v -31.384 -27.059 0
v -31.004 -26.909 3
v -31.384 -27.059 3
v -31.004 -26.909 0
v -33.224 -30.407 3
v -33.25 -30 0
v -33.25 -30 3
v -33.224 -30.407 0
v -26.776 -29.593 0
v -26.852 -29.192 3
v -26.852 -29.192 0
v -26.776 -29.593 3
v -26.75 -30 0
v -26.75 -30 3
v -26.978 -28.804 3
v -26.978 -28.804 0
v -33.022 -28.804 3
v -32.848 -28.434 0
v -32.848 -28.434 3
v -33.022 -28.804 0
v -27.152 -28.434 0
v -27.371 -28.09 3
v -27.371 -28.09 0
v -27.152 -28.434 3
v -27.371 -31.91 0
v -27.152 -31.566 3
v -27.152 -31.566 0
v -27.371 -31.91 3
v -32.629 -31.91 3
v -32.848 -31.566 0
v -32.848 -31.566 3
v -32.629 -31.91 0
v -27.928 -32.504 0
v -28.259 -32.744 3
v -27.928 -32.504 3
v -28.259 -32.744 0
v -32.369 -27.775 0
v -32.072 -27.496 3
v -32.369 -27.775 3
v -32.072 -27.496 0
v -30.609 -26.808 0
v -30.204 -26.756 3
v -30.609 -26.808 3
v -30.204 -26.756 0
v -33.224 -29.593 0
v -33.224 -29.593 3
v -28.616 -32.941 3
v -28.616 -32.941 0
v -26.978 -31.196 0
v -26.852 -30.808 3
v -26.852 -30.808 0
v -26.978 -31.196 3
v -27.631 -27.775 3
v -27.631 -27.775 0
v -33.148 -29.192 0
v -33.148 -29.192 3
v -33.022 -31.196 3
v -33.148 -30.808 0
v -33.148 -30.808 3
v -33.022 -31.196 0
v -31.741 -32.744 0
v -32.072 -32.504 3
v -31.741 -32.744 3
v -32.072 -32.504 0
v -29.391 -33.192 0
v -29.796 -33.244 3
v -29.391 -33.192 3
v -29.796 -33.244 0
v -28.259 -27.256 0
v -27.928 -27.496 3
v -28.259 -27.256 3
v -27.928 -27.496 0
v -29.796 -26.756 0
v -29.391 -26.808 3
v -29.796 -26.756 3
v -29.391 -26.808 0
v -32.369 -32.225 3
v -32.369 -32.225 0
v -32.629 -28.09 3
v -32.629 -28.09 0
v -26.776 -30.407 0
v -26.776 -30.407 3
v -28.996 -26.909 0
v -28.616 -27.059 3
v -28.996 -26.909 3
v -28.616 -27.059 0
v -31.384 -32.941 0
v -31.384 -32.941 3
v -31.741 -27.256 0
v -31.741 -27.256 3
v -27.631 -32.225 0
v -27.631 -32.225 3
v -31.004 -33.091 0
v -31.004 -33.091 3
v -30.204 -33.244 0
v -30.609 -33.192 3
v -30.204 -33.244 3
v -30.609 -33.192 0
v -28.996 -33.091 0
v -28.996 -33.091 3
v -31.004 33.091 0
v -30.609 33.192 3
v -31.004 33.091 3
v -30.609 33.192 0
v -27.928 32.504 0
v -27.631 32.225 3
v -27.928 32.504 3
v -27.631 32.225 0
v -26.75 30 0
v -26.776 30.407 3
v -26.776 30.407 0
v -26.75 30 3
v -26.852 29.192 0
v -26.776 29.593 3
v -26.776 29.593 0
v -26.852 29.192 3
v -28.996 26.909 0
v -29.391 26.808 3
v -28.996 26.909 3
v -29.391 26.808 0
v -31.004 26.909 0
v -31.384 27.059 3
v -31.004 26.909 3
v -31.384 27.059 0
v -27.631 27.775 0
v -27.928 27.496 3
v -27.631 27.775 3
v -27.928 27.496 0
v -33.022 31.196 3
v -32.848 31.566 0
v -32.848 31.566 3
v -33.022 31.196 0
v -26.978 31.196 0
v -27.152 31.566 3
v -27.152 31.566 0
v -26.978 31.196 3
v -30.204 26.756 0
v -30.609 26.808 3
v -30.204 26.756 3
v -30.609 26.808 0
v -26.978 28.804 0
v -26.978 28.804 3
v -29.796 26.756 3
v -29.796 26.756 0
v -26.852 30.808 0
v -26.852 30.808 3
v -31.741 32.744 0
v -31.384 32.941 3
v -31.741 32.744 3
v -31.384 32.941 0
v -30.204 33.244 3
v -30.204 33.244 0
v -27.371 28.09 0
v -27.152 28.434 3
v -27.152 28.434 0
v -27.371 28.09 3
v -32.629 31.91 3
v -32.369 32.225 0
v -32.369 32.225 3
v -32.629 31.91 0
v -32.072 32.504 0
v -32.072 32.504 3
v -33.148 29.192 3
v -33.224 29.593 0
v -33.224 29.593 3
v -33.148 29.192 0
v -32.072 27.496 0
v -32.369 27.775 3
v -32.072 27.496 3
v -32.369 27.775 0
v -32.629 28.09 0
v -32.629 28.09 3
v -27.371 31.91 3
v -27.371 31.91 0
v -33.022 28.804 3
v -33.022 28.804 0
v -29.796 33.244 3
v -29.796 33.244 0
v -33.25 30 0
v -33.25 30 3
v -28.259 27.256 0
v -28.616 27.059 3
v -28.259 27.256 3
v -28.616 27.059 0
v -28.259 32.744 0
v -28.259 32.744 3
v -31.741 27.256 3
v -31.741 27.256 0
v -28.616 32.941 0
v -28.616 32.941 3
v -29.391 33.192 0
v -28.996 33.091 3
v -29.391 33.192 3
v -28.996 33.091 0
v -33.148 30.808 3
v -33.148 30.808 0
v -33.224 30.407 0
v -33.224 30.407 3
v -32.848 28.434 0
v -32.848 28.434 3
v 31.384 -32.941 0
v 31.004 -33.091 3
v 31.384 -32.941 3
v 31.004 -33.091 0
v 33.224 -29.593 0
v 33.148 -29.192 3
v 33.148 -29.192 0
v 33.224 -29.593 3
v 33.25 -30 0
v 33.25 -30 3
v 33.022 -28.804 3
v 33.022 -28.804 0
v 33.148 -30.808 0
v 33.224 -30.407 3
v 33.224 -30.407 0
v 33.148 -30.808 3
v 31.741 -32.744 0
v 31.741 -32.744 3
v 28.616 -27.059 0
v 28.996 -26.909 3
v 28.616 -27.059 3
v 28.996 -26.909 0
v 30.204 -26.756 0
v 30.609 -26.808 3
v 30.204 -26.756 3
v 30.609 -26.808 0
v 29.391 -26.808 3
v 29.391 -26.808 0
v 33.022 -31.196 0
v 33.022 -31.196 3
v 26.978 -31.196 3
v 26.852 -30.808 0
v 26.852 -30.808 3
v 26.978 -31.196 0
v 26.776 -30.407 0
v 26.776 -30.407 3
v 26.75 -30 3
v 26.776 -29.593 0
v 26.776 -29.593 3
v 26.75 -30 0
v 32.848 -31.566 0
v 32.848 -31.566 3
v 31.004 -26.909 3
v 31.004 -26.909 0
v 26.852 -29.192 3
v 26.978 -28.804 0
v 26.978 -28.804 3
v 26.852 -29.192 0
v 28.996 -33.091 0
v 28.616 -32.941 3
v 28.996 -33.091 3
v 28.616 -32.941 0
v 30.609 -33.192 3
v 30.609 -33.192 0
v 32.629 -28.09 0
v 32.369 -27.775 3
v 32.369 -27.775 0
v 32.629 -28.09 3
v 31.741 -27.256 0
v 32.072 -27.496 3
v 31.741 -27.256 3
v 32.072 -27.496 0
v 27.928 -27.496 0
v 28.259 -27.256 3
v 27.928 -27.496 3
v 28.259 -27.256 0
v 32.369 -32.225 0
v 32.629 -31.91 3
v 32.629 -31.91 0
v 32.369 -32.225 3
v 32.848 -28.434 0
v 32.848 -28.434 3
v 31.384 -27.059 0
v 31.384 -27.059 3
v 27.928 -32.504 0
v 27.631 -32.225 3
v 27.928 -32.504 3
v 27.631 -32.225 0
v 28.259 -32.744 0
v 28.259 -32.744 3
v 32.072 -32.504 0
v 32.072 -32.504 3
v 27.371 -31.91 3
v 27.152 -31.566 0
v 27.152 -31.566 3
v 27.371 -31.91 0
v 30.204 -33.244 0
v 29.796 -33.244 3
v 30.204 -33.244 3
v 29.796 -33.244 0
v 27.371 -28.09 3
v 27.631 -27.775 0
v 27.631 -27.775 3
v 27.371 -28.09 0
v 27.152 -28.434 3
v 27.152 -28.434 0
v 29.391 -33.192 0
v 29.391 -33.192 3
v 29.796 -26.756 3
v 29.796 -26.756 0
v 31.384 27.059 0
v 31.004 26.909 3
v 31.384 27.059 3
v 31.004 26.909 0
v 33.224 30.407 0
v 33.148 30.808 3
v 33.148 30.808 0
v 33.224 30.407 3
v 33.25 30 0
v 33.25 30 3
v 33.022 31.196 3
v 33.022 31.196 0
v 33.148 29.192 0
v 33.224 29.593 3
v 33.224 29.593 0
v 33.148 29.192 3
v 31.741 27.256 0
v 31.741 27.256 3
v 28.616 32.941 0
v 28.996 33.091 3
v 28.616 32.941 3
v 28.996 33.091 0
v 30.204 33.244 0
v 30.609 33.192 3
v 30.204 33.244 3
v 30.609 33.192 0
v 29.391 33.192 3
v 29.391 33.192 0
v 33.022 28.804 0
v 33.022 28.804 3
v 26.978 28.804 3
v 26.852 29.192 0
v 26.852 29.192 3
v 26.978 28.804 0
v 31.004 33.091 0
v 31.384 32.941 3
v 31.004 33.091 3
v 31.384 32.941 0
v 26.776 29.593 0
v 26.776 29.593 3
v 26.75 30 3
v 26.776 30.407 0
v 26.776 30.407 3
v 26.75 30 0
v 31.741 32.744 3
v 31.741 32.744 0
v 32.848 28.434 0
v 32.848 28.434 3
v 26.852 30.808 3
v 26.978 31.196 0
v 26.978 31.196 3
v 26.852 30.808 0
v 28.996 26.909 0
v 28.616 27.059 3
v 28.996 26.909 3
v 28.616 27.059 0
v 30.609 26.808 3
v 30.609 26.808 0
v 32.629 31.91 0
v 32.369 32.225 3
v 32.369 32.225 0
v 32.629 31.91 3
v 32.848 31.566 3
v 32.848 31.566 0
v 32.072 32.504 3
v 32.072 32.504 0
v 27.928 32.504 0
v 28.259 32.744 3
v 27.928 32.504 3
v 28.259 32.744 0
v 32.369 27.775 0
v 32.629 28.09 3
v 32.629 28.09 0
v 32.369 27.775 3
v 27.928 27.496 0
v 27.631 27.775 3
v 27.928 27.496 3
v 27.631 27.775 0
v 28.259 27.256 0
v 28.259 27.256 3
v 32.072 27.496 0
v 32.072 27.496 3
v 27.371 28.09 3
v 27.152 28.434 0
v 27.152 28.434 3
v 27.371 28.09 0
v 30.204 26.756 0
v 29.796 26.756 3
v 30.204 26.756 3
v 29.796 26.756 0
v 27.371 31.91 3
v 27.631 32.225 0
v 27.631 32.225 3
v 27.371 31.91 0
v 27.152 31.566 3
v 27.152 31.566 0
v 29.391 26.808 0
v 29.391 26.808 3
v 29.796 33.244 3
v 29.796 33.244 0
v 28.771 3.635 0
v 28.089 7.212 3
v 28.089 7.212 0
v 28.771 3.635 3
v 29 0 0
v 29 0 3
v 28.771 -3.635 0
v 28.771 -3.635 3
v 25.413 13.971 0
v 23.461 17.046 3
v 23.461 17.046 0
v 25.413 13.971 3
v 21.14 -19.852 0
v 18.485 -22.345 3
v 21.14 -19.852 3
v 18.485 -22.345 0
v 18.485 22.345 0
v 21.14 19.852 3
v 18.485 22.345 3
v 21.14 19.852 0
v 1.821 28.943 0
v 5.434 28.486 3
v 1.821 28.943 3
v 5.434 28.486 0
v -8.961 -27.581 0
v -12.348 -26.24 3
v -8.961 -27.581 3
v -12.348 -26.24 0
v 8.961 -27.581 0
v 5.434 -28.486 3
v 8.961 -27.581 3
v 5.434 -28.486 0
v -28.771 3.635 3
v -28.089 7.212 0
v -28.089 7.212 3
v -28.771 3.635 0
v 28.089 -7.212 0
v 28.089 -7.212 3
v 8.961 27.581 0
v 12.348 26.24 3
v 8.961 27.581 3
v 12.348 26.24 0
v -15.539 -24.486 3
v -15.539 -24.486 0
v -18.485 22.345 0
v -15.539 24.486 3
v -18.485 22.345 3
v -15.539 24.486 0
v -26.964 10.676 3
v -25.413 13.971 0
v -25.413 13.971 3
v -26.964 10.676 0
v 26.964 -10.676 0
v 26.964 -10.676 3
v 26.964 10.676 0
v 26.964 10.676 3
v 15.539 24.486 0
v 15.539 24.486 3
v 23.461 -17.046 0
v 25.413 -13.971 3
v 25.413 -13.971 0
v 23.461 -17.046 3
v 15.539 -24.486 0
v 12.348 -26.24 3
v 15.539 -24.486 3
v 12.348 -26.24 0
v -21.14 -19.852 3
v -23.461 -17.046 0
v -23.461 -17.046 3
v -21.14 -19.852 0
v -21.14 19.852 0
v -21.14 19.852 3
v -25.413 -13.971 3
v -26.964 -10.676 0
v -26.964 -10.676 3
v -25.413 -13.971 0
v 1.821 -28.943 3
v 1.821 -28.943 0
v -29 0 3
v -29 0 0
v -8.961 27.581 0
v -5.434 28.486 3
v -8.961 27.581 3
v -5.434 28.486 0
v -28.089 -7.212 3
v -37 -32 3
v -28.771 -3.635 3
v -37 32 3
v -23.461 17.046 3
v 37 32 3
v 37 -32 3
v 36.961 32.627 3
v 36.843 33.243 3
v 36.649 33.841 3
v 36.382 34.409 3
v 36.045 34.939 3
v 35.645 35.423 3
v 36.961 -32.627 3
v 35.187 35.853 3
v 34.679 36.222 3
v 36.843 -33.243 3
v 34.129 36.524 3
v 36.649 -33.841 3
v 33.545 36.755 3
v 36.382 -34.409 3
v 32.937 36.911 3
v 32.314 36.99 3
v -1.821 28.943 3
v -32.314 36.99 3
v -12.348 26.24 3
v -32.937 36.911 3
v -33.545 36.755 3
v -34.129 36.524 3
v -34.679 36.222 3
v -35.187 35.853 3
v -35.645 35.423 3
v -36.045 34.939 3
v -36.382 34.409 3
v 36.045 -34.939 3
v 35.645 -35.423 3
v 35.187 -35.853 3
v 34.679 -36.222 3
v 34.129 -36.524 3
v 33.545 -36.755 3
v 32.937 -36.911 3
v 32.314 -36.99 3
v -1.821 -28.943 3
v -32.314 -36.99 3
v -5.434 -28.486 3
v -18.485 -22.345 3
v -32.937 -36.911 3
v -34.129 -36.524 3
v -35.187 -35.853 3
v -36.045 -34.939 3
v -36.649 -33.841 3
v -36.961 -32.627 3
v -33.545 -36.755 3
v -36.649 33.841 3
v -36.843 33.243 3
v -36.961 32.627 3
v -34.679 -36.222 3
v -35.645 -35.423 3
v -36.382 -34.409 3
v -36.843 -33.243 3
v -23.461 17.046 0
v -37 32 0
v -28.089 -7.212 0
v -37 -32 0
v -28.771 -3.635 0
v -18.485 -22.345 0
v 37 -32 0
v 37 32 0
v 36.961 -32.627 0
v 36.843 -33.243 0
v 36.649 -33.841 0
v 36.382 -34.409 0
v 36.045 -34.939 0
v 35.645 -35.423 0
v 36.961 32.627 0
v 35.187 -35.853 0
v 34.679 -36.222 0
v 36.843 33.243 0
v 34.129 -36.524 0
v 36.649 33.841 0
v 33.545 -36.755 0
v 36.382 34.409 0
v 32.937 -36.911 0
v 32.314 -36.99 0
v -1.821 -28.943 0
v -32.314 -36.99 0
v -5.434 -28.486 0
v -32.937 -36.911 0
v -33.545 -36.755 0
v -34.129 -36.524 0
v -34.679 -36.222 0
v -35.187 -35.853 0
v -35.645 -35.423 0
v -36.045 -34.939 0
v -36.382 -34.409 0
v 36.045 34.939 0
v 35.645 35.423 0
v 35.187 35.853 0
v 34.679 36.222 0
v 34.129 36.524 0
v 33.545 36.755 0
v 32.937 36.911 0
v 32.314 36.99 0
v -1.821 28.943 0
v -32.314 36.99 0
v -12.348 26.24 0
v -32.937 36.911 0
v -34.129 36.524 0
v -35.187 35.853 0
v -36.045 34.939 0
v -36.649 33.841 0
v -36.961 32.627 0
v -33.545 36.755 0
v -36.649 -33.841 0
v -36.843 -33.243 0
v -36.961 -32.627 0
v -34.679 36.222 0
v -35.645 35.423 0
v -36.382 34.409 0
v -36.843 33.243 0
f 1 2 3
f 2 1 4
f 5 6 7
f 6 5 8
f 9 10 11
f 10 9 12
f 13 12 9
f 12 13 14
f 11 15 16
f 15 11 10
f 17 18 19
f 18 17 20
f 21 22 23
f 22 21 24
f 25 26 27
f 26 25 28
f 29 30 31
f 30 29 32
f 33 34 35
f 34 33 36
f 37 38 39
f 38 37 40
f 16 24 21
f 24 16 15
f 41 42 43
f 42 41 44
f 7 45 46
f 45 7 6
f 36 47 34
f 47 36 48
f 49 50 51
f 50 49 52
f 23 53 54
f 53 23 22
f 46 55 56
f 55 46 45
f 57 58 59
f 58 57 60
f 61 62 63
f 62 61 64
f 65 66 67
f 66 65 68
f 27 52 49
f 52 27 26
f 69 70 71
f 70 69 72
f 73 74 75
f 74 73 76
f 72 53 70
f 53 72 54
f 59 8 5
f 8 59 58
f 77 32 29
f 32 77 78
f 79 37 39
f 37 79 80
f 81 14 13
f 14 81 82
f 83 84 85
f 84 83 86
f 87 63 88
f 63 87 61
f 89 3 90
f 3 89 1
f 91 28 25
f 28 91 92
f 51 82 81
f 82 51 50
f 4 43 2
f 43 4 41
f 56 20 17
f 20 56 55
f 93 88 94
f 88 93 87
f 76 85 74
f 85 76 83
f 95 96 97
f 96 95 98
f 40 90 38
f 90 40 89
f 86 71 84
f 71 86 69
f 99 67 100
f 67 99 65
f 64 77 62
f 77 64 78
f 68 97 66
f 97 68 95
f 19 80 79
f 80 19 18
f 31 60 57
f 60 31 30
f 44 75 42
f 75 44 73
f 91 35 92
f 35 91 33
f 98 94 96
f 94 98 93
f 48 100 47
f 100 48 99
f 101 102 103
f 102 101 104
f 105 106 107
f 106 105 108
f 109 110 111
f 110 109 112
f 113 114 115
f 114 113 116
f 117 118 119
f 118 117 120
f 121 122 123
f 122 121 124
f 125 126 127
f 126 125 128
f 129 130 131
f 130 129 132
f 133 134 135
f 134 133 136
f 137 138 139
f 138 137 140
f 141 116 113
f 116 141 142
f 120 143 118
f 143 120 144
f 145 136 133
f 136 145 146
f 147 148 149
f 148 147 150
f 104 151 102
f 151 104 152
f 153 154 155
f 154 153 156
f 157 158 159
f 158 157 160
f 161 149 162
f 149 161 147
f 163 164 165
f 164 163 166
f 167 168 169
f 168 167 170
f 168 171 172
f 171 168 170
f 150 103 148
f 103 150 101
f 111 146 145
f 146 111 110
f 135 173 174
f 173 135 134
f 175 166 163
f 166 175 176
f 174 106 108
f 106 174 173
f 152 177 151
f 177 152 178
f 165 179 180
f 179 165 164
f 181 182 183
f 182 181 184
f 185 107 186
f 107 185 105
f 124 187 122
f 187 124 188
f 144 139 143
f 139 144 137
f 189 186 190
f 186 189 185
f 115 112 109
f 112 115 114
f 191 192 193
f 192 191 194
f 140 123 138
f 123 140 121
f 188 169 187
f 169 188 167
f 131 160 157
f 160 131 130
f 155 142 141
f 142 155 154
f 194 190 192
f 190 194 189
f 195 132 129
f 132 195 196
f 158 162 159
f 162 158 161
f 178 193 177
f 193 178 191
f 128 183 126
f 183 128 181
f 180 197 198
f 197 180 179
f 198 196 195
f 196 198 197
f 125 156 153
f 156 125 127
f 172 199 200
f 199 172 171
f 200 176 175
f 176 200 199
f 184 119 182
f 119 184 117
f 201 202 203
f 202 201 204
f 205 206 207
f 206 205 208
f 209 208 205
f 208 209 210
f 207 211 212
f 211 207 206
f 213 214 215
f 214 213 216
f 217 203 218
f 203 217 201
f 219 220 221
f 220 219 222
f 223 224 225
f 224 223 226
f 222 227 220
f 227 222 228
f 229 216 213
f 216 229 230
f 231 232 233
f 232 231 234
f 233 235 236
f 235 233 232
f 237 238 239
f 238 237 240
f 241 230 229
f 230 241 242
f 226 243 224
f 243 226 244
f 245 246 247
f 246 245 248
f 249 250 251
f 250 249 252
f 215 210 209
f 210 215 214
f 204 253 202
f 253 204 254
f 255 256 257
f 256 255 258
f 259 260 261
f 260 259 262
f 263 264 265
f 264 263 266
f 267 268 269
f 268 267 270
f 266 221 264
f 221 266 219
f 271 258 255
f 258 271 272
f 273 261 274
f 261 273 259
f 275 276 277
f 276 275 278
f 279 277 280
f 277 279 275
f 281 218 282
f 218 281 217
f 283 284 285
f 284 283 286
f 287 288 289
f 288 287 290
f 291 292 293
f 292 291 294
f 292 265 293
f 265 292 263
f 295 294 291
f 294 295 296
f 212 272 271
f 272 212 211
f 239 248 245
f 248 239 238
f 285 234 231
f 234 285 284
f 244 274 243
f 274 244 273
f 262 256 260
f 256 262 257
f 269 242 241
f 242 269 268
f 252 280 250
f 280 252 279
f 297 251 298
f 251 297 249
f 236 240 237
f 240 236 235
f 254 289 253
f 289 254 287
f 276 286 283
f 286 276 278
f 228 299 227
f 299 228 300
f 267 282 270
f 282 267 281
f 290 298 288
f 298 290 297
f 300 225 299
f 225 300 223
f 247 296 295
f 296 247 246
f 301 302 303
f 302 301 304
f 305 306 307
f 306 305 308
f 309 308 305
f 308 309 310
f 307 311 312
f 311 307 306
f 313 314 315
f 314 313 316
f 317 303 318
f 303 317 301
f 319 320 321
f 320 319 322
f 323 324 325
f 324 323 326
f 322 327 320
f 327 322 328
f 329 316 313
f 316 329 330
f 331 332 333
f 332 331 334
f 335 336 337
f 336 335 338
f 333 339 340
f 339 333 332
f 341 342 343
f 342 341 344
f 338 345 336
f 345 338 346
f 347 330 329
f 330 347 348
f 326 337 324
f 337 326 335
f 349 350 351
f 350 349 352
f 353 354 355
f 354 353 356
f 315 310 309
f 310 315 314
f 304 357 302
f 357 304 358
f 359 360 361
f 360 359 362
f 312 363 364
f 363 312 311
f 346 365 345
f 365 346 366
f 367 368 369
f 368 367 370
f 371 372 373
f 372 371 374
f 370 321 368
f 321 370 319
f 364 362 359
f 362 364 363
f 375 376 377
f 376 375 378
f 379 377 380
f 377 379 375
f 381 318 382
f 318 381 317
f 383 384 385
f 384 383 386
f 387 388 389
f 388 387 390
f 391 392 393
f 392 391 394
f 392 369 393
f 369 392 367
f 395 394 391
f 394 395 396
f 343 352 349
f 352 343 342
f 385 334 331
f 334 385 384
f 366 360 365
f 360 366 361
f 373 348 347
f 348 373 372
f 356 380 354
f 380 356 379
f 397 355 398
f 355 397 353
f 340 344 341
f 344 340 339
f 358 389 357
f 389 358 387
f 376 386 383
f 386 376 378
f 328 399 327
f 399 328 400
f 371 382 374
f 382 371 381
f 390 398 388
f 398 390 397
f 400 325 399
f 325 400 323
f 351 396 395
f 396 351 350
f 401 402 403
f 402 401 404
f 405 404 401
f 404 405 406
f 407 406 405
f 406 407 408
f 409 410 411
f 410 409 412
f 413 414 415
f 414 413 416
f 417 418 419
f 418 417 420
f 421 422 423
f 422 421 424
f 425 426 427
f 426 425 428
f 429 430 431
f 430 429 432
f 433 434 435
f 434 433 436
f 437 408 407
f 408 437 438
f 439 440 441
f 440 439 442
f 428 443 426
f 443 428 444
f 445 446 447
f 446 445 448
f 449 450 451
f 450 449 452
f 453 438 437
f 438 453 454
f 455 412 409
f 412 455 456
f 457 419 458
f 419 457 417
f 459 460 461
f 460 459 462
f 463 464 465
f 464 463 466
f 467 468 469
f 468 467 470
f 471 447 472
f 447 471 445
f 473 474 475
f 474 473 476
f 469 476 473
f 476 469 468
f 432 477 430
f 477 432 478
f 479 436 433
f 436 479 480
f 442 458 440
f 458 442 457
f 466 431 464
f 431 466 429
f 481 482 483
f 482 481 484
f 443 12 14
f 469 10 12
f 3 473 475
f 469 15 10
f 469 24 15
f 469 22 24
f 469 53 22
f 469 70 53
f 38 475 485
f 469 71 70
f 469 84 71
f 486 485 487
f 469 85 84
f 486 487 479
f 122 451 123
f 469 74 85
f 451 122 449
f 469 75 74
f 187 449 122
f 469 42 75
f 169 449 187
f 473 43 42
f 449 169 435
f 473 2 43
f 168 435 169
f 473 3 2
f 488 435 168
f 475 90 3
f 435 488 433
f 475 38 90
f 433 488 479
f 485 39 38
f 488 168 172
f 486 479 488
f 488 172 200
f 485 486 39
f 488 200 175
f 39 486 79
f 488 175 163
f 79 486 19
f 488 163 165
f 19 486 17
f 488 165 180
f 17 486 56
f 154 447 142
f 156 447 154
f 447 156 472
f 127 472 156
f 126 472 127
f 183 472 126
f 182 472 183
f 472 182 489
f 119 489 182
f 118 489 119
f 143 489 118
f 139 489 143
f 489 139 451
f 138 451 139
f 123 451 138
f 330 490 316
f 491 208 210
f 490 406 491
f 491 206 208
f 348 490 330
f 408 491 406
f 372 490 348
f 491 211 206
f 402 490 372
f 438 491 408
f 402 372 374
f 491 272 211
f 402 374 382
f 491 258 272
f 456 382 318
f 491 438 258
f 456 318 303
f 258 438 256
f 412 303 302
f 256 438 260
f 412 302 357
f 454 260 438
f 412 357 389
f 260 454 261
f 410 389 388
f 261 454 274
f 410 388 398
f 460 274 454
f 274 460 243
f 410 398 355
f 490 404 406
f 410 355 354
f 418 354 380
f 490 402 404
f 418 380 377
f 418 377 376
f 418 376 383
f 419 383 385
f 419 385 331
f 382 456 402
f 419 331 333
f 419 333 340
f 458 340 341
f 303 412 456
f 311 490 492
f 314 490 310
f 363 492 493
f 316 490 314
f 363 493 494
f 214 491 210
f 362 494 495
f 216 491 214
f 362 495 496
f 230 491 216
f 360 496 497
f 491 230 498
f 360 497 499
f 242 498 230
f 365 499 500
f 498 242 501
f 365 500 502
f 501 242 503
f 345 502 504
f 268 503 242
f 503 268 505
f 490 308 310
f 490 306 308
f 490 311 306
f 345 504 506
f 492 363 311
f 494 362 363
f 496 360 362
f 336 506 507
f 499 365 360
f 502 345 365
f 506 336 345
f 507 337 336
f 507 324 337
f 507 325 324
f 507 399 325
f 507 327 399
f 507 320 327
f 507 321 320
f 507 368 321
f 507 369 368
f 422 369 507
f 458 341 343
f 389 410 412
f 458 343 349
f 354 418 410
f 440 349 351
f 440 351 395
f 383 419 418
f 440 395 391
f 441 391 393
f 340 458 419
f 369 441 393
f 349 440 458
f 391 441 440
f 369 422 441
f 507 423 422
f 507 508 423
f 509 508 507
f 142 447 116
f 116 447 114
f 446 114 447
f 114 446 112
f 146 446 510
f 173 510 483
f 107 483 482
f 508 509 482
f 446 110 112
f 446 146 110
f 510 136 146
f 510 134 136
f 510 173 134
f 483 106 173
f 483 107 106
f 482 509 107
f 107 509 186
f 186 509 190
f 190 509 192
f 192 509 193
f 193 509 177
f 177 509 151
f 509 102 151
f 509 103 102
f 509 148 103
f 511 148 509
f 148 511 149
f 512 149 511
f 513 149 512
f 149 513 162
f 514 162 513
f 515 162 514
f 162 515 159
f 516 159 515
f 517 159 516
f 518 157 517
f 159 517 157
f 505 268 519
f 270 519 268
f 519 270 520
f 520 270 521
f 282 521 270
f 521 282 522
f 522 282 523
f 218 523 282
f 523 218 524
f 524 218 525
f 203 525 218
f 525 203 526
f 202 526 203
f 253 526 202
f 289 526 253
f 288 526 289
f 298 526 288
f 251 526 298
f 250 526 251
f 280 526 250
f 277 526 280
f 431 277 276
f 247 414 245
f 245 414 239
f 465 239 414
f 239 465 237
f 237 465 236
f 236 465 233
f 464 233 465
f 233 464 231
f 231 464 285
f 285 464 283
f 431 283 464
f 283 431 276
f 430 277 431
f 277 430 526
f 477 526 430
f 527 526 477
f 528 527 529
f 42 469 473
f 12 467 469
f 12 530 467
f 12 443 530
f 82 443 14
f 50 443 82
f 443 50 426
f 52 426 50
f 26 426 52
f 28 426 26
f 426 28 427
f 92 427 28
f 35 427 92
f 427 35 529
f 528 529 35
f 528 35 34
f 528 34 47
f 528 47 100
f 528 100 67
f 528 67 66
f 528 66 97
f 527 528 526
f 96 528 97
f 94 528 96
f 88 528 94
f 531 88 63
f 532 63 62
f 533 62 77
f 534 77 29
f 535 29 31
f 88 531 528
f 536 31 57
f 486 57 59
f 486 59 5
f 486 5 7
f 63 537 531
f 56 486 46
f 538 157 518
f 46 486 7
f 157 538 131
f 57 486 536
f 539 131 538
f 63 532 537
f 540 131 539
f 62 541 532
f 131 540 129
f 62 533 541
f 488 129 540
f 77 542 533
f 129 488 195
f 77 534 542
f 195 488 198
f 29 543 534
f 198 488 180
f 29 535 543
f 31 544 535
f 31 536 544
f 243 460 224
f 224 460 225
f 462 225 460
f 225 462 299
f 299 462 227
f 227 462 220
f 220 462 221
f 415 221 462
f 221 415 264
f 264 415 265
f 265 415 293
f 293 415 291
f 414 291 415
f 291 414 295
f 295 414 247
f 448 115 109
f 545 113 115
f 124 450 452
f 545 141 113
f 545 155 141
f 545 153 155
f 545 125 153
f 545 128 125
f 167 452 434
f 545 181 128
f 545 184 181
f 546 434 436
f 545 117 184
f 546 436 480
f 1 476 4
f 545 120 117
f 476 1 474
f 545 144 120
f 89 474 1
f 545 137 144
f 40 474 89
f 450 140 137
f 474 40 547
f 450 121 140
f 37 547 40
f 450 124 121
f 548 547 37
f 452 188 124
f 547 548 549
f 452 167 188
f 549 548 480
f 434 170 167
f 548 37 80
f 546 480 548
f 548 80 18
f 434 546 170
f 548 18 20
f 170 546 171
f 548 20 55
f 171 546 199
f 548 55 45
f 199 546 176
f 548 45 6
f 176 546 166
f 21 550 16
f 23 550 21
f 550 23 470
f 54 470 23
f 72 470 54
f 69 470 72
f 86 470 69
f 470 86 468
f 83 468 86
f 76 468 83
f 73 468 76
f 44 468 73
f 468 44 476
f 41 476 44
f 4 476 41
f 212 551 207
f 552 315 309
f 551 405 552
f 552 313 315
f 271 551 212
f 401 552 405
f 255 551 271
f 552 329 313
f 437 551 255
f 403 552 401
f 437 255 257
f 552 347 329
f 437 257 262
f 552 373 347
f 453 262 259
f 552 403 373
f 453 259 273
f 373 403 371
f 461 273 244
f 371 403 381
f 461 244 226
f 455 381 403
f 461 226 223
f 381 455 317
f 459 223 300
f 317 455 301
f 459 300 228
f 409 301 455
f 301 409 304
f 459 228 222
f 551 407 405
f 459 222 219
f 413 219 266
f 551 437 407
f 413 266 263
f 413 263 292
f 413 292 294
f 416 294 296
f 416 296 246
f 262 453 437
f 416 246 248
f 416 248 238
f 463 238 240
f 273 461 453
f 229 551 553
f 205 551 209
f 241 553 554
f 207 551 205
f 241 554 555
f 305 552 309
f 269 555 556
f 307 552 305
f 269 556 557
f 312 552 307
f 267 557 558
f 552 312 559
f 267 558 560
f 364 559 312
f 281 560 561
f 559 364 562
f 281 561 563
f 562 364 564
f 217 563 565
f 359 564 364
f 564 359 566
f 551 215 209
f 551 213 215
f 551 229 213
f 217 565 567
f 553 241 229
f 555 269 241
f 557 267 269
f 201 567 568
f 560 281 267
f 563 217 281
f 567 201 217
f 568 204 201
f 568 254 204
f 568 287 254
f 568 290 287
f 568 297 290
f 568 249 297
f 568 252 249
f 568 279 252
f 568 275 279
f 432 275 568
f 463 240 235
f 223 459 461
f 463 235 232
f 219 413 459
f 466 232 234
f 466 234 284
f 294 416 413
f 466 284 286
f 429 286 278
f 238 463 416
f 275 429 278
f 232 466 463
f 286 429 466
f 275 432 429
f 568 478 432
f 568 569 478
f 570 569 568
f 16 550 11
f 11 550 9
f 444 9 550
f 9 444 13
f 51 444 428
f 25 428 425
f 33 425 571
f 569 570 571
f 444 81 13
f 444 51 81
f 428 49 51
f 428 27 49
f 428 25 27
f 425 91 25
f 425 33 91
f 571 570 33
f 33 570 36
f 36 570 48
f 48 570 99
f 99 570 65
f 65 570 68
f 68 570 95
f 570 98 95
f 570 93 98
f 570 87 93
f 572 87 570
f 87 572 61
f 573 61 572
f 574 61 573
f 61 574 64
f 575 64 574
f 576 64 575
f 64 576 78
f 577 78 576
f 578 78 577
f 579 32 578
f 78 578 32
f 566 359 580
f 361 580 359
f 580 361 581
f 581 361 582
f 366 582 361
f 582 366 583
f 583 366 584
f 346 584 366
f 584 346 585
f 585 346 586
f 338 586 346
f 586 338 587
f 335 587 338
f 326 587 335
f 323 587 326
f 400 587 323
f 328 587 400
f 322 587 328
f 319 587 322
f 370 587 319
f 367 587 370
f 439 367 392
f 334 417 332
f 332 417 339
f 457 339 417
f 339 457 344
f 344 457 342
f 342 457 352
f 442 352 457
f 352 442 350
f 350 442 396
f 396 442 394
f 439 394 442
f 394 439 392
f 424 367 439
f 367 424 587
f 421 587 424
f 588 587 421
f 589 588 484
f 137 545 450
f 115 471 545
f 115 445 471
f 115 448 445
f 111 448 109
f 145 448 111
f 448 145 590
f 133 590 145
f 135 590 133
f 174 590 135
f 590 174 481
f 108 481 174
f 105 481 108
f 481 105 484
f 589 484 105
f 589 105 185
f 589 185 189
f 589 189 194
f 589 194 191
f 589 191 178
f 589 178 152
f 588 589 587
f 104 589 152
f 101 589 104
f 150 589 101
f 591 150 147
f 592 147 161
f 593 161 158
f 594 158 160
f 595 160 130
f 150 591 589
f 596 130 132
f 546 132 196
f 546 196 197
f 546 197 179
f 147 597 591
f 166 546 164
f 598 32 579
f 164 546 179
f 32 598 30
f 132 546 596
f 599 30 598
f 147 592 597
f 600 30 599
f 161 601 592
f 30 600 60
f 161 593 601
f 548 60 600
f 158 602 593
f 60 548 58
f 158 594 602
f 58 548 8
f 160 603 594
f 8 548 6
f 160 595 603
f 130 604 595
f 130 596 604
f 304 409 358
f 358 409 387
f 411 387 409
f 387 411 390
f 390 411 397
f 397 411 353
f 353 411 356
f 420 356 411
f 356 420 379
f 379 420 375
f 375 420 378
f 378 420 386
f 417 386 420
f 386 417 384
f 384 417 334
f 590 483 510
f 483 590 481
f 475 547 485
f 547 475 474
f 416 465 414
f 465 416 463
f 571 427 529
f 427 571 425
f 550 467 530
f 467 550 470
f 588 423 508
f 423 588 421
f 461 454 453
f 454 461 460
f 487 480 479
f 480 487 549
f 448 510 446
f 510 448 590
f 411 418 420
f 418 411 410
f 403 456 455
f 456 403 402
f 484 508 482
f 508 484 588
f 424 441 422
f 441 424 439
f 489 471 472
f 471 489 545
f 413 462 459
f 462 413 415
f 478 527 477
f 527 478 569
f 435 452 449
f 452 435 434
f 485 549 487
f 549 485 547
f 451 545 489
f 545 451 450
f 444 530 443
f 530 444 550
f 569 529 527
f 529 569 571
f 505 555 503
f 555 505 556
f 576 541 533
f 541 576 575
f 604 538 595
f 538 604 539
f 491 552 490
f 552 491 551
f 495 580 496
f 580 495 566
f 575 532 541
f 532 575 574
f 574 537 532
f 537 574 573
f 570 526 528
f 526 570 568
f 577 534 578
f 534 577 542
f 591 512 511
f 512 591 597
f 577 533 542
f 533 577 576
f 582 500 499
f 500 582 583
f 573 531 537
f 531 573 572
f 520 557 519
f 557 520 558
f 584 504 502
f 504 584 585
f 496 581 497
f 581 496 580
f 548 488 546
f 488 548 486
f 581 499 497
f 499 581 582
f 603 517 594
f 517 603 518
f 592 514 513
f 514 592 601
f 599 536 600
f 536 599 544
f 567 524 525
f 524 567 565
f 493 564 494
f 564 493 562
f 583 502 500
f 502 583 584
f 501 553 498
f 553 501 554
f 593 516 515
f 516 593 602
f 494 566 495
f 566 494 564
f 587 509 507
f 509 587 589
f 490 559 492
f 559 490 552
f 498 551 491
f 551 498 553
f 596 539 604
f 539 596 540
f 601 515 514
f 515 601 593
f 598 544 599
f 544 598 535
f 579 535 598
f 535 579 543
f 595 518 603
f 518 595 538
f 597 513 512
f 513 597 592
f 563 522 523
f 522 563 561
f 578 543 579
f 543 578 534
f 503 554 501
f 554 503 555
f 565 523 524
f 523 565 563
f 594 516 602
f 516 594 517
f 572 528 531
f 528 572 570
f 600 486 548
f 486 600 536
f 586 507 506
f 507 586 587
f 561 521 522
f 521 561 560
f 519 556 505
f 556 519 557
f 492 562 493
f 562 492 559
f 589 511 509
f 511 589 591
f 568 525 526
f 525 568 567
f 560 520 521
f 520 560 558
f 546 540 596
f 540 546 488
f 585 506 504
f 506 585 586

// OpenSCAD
$fn = 50;


difference() {
	union() {
		hull() {
			translate(v = [-32.0000000000, 32.0000000000, 0]) {
				cylinder(h = 3, r = 5);
			}
			translate(v = [32.0000000000, 32.0000000000, 0]) {
				cylinder(h = 3, r = 5);
			}
			translate(v = [-32.0000000000, -32.0000000000, 0]) {
				cylinder(h = 3, r = 5);
			}
			translate(v = [32.0000000000, -32.0000000000, 0]) {
				cylinder(h = 3, r = 5);
			}
		}
	}
	union() {
		#translate(v = [-30.0000000000, -30.0000000000, -100.0000000000]) {
			cylinder(h = 200, r = 3.2500000000);
		}
		#translate(v = [-30.0000000000, 30.0000000000, -100.0000000000]) {
			cylinder(h = 200, r = 3.2500000000);
		}
		#translate(v = [30.0000000000, -30.0000000000, -100.0000000000]) {
			cylinder(h = 200, r = 3.2500000000);
		}
		#translate(v = [30.0000000000, 30.0000000000, -100.0000000000]) {
			cylinder(h = 200, r = 3.2500000000);
		}
		#cylinder(h = 3, r = 29.0000000000);
	}
}
